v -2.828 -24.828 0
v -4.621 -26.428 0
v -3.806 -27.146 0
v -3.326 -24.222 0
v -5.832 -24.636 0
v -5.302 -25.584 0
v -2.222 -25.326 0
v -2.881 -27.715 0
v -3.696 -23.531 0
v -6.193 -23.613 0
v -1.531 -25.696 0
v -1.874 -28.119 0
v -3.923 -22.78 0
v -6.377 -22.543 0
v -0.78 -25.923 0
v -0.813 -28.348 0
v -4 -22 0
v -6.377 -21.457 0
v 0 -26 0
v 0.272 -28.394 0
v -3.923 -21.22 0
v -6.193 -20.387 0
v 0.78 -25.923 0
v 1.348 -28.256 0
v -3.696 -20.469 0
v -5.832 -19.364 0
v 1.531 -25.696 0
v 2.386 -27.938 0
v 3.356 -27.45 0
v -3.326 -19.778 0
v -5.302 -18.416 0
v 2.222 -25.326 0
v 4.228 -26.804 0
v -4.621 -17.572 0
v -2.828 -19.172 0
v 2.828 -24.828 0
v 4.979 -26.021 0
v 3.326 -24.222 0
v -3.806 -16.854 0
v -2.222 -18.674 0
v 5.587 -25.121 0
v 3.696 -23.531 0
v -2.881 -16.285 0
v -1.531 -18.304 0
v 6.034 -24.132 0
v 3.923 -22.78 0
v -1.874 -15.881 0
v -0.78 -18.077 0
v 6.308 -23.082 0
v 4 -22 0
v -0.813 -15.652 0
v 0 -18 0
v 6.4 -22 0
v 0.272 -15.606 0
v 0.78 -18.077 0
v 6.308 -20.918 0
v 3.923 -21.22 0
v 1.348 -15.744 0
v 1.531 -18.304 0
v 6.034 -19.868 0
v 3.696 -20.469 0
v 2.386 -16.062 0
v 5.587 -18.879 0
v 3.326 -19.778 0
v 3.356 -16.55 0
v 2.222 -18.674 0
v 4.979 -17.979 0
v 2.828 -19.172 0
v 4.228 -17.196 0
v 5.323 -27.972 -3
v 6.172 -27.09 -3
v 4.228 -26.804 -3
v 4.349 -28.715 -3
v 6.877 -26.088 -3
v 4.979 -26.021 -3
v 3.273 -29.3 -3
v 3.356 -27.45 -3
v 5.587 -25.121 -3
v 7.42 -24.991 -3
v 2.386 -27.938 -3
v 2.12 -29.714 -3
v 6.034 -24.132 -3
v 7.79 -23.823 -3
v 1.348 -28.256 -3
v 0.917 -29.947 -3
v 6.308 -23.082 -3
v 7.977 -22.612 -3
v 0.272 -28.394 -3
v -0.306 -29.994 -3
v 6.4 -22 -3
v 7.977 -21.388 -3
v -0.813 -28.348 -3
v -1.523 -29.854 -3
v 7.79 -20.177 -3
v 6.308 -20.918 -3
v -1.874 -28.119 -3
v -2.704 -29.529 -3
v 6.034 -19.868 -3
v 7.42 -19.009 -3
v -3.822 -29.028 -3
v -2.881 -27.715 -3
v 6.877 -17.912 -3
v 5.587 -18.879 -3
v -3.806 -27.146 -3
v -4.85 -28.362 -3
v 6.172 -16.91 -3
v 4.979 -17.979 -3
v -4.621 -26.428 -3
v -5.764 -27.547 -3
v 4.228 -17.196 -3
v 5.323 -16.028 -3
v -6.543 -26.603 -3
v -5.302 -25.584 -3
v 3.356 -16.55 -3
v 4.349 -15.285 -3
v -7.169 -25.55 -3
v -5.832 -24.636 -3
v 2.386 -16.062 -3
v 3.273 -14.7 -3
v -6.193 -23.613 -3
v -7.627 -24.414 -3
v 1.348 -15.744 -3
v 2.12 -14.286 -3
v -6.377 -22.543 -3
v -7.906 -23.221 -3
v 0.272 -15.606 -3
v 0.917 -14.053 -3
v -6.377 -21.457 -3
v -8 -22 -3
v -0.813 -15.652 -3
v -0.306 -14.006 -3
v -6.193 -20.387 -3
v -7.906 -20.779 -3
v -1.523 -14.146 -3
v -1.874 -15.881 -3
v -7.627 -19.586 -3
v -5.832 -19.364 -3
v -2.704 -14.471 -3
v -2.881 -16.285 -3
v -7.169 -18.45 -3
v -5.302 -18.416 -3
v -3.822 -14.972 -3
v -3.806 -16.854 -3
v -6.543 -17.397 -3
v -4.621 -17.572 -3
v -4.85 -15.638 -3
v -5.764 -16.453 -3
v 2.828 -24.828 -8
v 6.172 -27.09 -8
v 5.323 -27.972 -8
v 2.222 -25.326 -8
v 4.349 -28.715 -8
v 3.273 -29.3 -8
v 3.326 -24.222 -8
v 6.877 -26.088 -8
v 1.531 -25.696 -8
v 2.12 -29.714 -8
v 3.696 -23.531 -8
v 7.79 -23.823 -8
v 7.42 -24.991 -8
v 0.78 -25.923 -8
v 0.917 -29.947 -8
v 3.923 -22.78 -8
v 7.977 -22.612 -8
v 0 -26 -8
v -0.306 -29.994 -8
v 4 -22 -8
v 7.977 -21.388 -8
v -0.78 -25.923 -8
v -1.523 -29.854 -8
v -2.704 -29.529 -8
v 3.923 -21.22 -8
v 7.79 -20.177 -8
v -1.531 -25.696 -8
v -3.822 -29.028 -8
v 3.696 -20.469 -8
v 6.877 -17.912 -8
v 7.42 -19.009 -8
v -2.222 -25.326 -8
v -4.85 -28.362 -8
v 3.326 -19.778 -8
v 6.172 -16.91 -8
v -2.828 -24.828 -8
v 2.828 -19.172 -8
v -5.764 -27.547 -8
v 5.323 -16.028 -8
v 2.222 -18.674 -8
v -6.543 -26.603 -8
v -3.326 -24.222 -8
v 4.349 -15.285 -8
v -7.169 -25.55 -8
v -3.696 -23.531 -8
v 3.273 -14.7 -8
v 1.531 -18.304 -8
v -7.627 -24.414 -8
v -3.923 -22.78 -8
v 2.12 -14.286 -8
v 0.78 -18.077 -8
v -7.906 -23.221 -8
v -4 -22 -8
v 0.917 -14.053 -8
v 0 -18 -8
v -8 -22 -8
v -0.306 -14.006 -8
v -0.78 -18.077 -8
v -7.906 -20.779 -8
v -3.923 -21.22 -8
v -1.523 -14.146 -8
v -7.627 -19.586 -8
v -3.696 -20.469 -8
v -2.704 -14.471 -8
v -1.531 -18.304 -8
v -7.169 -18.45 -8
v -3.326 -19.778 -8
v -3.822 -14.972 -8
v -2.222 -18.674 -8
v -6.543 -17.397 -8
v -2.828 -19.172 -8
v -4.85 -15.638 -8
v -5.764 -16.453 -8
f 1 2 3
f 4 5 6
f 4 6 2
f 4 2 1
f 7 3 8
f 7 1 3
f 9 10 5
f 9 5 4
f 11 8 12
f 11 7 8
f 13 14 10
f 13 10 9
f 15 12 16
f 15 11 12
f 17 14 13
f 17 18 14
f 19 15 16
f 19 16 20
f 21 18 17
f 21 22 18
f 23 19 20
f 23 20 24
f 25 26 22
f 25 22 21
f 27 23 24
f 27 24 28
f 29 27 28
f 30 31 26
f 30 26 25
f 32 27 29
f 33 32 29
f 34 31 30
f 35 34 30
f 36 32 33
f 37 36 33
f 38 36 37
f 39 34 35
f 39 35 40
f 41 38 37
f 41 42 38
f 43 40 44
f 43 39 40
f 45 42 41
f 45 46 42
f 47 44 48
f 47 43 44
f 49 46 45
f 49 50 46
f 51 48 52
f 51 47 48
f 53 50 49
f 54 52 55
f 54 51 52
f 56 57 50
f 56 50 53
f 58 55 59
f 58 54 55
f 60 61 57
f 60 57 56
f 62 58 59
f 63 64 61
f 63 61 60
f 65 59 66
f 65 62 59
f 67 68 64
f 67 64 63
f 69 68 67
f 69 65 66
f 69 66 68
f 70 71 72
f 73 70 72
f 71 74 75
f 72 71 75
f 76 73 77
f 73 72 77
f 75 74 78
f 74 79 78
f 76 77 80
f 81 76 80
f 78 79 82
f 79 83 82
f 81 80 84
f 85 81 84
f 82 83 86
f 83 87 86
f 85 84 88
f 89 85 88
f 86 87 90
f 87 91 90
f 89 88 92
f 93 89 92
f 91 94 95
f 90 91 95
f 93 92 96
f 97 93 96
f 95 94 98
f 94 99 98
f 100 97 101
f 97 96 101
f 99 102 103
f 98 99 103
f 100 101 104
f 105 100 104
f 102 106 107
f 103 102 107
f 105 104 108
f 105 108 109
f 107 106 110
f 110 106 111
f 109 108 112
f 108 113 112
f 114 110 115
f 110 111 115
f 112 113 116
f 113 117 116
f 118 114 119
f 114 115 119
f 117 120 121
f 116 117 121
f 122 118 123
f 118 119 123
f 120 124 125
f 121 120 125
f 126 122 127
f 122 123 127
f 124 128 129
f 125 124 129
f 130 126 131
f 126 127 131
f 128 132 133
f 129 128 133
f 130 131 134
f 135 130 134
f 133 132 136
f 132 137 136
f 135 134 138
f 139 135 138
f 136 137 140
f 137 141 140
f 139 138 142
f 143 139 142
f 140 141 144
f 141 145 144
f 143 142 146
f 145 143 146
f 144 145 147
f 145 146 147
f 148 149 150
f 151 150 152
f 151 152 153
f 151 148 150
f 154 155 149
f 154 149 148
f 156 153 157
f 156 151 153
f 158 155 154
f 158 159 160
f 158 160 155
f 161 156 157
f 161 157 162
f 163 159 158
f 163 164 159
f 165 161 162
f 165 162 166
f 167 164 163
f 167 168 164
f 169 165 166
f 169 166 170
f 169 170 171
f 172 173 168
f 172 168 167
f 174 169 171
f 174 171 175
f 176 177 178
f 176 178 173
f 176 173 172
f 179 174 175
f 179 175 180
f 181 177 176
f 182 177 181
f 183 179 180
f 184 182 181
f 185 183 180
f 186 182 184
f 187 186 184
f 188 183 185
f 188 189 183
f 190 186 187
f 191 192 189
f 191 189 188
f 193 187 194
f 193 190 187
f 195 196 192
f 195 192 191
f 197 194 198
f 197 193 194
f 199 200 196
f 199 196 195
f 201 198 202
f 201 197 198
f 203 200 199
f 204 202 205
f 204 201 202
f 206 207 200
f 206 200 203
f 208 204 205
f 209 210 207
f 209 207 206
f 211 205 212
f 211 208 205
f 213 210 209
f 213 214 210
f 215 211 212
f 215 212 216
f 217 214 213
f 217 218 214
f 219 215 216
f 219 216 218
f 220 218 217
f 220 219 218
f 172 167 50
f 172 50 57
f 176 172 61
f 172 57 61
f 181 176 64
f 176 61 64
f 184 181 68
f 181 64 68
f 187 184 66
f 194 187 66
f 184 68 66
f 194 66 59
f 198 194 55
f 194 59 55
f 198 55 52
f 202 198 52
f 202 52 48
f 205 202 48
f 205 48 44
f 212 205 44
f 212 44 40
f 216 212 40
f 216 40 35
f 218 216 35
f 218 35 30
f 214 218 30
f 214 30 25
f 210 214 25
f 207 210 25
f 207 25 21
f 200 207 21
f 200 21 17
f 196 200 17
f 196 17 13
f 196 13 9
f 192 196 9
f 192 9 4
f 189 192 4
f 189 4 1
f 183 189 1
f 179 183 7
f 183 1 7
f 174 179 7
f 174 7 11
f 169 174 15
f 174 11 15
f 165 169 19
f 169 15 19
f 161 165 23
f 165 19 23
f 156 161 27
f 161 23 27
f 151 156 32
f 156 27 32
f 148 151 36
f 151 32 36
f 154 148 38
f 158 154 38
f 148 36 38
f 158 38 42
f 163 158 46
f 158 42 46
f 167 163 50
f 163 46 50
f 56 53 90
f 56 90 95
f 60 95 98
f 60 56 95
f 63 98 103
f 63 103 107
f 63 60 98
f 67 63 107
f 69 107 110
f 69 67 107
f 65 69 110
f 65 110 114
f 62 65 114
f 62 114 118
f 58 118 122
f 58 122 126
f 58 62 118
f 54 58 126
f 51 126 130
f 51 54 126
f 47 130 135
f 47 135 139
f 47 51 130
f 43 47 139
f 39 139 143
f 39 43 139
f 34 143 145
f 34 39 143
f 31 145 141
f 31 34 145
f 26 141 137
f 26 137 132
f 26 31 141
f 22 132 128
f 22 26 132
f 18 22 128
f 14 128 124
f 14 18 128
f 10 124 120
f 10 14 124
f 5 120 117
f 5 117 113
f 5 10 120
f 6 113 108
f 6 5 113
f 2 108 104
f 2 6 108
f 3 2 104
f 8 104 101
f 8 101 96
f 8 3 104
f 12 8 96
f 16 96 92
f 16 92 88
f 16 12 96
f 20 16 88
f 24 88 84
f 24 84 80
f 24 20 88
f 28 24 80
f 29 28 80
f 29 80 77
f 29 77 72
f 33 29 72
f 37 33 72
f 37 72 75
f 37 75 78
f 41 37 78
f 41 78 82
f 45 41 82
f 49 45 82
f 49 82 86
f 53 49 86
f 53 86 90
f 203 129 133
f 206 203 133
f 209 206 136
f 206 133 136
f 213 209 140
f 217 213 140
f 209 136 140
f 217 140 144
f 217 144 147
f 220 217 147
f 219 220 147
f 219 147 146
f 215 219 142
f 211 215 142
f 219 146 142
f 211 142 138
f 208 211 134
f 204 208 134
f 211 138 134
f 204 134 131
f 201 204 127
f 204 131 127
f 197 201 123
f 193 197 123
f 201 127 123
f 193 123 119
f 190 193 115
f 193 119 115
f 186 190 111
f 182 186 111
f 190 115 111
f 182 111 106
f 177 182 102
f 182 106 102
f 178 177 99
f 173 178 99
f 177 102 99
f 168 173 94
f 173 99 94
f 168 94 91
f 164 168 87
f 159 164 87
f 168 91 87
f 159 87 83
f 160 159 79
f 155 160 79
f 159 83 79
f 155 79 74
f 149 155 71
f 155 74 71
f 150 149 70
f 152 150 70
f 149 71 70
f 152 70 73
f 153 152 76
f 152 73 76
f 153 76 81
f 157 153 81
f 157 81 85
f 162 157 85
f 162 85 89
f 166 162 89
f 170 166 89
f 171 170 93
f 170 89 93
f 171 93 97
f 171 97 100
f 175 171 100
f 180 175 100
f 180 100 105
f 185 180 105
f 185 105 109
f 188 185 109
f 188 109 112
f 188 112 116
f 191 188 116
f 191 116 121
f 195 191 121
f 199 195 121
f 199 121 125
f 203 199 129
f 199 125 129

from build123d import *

# Parameters (mm, degrees)
SKETCH1_R          = 6.4
EXTRUDE1_DEPTH     = 3
SKETCH2_R          = 8
EXTRUDE2_DEPTH     = 5
SKETCH3_R          = 4
CUT_EXTRUDE1_DEPTH = 33.062439084


with BuildPart() as part:
    # Sketch1 → Extrude1 (new body)
    with BuildSketch(Plane.XY):
        with Locations((0, -22)):
            Circle(SKETCH1_R)
    extrude(amount=-EXTRUDE1_DEPTH)

    # Sketch2 → Extrude2 (add)
    with BuildSketch(Plane(origin=(0, 0, -3), x_dir=(-1, 0, 0), z_dir=(0, 0, -1))):
        with Locations((0, -22)):
            Circle(SKETCH2_R)
    extrude(amount=EXTRUDE2_DEPTH)

    # Sketch3 → Cut-Extrude1 (cut, through all)
    with BuildSketch(Plane.XY):
        with Locations((0, -22)):
            Circle(SKETCH3_R)
    extrude(amount=-CUT_EXTRUDE1_DEPTH, mode=Mode.SUBTRACT)


solid = part.part
